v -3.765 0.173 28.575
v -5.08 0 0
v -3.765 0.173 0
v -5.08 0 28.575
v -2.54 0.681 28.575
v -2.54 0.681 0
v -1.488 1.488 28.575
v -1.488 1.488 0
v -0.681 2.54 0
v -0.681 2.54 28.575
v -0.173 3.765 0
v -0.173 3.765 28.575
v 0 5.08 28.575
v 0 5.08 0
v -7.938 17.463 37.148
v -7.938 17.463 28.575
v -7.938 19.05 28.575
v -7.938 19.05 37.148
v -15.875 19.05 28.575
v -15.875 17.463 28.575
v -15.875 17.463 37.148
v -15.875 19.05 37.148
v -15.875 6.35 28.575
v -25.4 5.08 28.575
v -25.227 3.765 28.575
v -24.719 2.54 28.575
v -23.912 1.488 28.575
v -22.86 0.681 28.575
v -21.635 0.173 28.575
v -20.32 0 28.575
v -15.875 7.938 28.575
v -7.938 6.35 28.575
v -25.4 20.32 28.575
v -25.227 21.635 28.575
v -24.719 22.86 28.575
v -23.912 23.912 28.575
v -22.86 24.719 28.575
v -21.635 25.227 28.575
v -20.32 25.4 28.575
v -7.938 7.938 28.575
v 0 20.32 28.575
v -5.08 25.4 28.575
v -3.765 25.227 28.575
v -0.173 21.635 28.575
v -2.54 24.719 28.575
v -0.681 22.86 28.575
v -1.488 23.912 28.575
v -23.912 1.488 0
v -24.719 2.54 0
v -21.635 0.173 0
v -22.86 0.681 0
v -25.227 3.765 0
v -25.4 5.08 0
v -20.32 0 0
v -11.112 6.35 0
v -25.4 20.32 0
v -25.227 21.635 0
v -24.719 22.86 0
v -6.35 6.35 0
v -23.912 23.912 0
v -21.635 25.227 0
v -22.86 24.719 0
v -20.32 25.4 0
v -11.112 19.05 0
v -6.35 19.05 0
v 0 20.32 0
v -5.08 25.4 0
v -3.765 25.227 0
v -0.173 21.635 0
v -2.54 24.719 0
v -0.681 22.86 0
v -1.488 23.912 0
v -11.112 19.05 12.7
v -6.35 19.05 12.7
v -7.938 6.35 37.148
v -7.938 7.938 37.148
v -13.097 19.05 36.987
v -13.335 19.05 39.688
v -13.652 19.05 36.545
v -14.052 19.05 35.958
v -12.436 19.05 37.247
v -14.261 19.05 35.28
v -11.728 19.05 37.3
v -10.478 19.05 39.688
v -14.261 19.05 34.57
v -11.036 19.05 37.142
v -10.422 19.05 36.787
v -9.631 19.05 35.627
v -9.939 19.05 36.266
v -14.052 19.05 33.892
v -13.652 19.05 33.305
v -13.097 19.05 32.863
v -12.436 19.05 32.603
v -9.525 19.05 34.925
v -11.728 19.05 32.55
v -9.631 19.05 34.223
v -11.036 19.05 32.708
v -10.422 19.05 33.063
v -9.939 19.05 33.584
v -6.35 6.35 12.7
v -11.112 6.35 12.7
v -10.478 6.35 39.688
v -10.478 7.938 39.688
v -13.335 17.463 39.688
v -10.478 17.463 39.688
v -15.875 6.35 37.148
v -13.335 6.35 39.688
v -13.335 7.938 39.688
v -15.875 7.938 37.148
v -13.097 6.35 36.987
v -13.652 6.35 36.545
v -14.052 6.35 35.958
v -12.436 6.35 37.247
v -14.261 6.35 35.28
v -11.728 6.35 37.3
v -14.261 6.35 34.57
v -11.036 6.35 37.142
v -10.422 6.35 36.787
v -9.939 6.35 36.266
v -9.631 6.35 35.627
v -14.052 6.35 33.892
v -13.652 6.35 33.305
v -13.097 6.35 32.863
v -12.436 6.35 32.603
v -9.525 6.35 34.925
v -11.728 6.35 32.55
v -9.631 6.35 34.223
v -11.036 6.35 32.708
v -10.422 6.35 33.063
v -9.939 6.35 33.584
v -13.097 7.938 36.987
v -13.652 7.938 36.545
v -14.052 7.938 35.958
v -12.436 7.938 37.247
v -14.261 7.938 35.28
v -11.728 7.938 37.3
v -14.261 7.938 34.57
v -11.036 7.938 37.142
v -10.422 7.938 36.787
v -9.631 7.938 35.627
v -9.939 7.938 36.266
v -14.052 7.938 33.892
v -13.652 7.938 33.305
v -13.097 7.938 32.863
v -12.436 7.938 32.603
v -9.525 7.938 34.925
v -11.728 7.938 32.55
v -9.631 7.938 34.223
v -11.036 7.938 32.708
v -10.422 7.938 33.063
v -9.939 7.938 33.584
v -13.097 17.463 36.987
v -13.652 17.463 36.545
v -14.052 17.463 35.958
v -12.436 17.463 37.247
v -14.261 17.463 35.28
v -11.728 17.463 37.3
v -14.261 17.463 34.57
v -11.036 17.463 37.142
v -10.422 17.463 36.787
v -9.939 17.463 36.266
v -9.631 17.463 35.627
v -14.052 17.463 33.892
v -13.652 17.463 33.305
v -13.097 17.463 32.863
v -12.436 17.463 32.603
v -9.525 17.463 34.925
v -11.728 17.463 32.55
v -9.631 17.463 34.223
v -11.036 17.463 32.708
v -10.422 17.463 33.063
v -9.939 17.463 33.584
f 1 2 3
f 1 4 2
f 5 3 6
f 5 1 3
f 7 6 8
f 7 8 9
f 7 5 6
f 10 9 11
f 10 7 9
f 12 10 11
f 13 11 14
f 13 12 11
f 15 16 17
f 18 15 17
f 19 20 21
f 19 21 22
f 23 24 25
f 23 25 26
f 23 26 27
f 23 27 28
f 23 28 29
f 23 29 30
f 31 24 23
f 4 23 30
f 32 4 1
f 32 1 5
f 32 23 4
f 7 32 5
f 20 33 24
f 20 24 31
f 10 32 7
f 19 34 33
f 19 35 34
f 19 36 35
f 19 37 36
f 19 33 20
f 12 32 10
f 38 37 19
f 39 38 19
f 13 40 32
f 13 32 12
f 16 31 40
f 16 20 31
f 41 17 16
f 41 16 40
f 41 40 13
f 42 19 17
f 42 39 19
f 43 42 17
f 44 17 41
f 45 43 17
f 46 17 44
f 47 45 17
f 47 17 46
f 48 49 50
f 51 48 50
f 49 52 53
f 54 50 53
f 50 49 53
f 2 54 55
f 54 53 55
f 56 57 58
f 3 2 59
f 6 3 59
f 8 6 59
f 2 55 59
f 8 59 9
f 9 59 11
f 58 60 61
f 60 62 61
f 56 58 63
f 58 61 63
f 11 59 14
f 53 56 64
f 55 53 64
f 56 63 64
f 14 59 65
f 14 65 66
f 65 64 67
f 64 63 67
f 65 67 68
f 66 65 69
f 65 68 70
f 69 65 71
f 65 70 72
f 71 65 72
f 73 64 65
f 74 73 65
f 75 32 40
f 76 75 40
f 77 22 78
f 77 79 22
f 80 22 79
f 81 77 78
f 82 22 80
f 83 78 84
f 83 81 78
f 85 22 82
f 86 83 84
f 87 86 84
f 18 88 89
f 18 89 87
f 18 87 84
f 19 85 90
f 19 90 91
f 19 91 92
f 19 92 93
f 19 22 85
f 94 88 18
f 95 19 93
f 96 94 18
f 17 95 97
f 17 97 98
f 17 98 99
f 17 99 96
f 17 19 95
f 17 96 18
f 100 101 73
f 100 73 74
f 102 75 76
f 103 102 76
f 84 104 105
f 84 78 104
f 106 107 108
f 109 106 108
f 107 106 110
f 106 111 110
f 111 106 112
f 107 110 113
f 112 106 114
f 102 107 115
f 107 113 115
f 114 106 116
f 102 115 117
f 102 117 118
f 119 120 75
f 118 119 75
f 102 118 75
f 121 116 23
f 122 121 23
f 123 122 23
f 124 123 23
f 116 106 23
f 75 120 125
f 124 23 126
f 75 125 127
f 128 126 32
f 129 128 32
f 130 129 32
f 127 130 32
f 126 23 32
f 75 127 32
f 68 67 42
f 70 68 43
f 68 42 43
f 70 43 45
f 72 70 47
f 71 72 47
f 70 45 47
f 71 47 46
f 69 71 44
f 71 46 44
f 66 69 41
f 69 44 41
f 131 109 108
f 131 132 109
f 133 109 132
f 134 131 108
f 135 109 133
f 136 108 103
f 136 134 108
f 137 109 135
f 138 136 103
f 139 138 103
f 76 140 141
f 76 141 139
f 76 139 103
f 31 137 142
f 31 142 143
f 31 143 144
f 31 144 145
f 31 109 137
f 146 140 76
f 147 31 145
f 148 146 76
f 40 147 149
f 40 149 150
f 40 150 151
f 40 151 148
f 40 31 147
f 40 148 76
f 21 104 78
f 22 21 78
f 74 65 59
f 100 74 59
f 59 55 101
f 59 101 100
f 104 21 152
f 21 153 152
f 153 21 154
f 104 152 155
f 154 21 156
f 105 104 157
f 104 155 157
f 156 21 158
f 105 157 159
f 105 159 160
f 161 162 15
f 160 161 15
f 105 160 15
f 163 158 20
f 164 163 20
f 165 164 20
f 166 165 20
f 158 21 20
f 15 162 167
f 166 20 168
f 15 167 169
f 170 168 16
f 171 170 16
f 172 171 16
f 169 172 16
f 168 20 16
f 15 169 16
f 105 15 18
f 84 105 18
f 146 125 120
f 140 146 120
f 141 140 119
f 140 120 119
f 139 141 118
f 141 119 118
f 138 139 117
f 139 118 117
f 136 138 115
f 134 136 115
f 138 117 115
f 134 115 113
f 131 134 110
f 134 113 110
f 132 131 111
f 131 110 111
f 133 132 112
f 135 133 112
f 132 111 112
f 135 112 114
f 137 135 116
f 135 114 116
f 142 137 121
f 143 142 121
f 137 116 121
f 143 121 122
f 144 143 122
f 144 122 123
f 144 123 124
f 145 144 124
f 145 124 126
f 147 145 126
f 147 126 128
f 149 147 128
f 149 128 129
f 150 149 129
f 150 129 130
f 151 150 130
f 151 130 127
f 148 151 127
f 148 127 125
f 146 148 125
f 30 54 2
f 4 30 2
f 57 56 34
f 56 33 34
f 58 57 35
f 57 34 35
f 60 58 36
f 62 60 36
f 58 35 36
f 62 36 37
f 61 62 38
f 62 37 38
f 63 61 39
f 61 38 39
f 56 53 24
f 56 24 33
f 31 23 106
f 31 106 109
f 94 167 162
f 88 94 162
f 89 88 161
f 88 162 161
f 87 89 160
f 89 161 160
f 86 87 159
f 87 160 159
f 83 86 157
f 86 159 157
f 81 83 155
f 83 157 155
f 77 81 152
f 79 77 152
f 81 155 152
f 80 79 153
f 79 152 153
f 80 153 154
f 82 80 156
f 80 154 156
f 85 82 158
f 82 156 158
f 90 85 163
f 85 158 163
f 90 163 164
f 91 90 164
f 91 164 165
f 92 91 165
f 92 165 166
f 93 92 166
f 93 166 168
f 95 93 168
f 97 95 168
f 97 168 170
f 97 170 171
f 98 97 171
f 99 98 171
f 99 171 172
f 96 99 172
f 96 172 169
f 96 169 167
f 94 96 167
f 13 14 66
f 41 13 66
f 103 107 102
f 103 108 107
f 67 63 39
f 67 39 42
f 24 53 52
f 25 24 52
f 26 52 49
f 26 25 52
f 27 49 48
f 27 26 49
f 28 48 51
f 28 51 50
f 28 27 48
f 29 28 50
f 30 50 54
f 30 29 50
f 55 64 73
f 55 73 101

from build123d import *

# Parameters (mm, degrees)
F0_W     = 25.4
F0_H     = 25.4
F1_DEPTH = 28.575
F2_W     = 7.9375
F2_H     = 1.5875
F3_DEPTH = 11.1125
F4_R     = 2.38125
F5_DEPTH = 12.954
F6_R     = 5.08
F7_SIZE  = 2.54
F8_W     = 4.7625
F8_H     = 12.7
F9_DEPTH = 12.7


with BuildPart() as f1:
    # F0 (on Top) → F1 (new body)
    with BuildSketch(Plane.XY):
        with Locations((-12.7, 12.7)):
            Rectangle(F0_W, F0_H)
    extrude(amount=F1_DEPTH)

    # F2 (on face) → F3 (join)
    with BuildSketch(Plane.XY.offset(28.575)):
        with Locations((-11.90625, 7.14375)):
            Rectangle(F2_W, F2_H)
        with Locations((-11.90625, 18.25625)):
            Rectangle(F2_W, F2_H)
    extrude(amount=F3_DEPTH)

    # F4 (on face) → F5 (cut)
    with BuildSketch(Plane.XZ.offset(-6.35)):
        with Locations((-11.90625, 34.925)):
            Circle(F4_R)
    extrude(amount=-F5_DEPTH, mode=Mode.SUBTRACT)

    # F6
    f6_edges = [f1.edges().sort_by_distance(p)[0] for p in [
        (0, 25.4, 14.2875),
        (0, 0, 14.2875),
        (-25.4, 0, 14.2875),
        (-25.4, 25.4, 14.2875),
    ]]
    fillet(f6_edges, radius=F6_R)

    # F7
    f7_edges = [f1.edges().sort_by_distance(p)[0] for p in [
        (-15.875, 18.25625, 39.6875),
        (-7.9375, 18.25625, 39.6875),
        (-7.9375, 7.14375, 39.6875),
        (-15.875, 7.14375, 39.6875),
    ]]
    chamfer(f7_edges, length=F7_SIZE)

    # F8 (on face) → F9 (cut)
    with BuildSketch(Plane(origin=(0, 0, 0), x_dir=(1, 0, 0), z_dir=(0, 0, -1))):
        with Locations((-8.73125, -12.7)):
            Rectangle(F8_W, F8_H)
    extrude(amount=-F9_DEPTH, mode=Mode.SUBTRACT)


solid = f1.part
